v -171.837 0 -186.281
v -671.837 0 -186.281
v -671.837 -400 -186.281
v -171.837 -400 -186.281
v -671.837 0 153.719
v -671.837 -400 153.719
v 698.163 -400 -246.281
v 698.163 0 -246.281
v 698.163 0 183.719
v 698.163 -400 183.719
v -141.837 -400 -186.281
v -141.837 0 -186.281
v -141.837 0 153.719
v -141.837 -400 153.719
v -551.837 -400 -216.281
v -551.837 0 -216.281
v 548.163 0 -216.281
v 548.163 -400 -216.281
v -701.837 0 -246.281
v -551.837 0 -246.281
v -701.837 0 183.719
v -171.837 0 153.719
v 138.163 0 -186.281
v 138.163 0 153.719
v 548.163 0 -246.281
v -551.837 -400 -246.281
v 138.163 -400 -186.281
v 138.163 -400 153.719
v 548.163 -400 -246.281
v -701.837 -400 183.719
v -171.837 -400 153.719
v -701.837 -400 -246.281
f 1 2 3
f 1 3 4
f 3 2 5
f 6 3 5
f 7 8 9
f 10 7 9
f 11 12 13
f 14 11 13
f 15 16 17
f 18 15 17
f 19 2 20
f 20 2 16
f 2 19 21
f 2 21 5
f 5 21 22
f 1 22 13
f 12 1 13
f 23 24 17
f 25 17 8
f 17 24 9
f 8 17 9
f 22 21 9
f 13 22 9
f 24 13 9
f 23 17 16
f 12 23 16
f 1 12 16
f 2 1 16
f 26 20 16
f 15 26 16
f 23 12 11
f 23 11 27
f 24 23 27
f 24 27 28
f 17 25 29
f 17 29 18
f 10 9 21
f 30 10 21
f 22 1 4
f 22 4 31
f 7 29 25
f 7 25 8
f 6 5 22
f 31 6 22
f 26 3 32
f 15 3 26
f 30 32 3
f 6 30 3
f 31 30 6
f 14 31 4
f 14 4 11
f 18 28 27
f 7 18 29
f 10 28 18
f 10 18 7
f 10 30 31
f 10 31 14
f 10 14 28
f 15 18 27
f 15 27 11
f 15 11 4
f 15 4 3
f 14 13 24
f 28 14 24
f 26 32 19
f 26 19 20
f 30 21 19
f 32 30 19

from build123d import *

# Parameters (mm, degrees)
F0_W     = 500
F0_H     = 340
F0_W_2   = 280
F0_W_3   = 150
F0_H_2   = 30
F1_DEPTH = 400


with BuildPart() as f1:
    # F0 (on Front) → F1 (new body)
    with BuildSketch(Plane.XZ):
        Polygon((698.162909, 183.718975), (-701.837091, 183.718975), (-701.837091, 143.844262), (-701.837091, 143.718975), (-701.837091, -216.281025), (-551.837091, -216.281025), (548.162909, -216.281025), (698.162909, -216.281025), (698.162909, -186.281025), (698.162909, 153.718975), align=None)
        with Locations((-421.837091, -16.281025)):
            Rectangle(F0_W, F0_H, mode=Mode.SUBTRACT)
        with Locations((-1.837091, -16.281025)):
            Rectangle(F0_W_2, F0_H, mode=Mode.SUBTRACT)
        with Locations((418.162909, -16.281025)):
            Rectangle(F0_W, F0_H, mode=Mode.SUBTRACT)
        with Locations((623.162909, -231.281025)):
            Rectangle(F0_W_3, F0_H_2)
        with Locations((418.162909, -16.281025)):
            Rectangle(F0_W, F0_H)
        with Locations((-626.837091, -231.281025)):
            Rectangle(F0_W_3, F0_H_2)
    extrude(amount=F1_DEPTH)


solid = f1.part
